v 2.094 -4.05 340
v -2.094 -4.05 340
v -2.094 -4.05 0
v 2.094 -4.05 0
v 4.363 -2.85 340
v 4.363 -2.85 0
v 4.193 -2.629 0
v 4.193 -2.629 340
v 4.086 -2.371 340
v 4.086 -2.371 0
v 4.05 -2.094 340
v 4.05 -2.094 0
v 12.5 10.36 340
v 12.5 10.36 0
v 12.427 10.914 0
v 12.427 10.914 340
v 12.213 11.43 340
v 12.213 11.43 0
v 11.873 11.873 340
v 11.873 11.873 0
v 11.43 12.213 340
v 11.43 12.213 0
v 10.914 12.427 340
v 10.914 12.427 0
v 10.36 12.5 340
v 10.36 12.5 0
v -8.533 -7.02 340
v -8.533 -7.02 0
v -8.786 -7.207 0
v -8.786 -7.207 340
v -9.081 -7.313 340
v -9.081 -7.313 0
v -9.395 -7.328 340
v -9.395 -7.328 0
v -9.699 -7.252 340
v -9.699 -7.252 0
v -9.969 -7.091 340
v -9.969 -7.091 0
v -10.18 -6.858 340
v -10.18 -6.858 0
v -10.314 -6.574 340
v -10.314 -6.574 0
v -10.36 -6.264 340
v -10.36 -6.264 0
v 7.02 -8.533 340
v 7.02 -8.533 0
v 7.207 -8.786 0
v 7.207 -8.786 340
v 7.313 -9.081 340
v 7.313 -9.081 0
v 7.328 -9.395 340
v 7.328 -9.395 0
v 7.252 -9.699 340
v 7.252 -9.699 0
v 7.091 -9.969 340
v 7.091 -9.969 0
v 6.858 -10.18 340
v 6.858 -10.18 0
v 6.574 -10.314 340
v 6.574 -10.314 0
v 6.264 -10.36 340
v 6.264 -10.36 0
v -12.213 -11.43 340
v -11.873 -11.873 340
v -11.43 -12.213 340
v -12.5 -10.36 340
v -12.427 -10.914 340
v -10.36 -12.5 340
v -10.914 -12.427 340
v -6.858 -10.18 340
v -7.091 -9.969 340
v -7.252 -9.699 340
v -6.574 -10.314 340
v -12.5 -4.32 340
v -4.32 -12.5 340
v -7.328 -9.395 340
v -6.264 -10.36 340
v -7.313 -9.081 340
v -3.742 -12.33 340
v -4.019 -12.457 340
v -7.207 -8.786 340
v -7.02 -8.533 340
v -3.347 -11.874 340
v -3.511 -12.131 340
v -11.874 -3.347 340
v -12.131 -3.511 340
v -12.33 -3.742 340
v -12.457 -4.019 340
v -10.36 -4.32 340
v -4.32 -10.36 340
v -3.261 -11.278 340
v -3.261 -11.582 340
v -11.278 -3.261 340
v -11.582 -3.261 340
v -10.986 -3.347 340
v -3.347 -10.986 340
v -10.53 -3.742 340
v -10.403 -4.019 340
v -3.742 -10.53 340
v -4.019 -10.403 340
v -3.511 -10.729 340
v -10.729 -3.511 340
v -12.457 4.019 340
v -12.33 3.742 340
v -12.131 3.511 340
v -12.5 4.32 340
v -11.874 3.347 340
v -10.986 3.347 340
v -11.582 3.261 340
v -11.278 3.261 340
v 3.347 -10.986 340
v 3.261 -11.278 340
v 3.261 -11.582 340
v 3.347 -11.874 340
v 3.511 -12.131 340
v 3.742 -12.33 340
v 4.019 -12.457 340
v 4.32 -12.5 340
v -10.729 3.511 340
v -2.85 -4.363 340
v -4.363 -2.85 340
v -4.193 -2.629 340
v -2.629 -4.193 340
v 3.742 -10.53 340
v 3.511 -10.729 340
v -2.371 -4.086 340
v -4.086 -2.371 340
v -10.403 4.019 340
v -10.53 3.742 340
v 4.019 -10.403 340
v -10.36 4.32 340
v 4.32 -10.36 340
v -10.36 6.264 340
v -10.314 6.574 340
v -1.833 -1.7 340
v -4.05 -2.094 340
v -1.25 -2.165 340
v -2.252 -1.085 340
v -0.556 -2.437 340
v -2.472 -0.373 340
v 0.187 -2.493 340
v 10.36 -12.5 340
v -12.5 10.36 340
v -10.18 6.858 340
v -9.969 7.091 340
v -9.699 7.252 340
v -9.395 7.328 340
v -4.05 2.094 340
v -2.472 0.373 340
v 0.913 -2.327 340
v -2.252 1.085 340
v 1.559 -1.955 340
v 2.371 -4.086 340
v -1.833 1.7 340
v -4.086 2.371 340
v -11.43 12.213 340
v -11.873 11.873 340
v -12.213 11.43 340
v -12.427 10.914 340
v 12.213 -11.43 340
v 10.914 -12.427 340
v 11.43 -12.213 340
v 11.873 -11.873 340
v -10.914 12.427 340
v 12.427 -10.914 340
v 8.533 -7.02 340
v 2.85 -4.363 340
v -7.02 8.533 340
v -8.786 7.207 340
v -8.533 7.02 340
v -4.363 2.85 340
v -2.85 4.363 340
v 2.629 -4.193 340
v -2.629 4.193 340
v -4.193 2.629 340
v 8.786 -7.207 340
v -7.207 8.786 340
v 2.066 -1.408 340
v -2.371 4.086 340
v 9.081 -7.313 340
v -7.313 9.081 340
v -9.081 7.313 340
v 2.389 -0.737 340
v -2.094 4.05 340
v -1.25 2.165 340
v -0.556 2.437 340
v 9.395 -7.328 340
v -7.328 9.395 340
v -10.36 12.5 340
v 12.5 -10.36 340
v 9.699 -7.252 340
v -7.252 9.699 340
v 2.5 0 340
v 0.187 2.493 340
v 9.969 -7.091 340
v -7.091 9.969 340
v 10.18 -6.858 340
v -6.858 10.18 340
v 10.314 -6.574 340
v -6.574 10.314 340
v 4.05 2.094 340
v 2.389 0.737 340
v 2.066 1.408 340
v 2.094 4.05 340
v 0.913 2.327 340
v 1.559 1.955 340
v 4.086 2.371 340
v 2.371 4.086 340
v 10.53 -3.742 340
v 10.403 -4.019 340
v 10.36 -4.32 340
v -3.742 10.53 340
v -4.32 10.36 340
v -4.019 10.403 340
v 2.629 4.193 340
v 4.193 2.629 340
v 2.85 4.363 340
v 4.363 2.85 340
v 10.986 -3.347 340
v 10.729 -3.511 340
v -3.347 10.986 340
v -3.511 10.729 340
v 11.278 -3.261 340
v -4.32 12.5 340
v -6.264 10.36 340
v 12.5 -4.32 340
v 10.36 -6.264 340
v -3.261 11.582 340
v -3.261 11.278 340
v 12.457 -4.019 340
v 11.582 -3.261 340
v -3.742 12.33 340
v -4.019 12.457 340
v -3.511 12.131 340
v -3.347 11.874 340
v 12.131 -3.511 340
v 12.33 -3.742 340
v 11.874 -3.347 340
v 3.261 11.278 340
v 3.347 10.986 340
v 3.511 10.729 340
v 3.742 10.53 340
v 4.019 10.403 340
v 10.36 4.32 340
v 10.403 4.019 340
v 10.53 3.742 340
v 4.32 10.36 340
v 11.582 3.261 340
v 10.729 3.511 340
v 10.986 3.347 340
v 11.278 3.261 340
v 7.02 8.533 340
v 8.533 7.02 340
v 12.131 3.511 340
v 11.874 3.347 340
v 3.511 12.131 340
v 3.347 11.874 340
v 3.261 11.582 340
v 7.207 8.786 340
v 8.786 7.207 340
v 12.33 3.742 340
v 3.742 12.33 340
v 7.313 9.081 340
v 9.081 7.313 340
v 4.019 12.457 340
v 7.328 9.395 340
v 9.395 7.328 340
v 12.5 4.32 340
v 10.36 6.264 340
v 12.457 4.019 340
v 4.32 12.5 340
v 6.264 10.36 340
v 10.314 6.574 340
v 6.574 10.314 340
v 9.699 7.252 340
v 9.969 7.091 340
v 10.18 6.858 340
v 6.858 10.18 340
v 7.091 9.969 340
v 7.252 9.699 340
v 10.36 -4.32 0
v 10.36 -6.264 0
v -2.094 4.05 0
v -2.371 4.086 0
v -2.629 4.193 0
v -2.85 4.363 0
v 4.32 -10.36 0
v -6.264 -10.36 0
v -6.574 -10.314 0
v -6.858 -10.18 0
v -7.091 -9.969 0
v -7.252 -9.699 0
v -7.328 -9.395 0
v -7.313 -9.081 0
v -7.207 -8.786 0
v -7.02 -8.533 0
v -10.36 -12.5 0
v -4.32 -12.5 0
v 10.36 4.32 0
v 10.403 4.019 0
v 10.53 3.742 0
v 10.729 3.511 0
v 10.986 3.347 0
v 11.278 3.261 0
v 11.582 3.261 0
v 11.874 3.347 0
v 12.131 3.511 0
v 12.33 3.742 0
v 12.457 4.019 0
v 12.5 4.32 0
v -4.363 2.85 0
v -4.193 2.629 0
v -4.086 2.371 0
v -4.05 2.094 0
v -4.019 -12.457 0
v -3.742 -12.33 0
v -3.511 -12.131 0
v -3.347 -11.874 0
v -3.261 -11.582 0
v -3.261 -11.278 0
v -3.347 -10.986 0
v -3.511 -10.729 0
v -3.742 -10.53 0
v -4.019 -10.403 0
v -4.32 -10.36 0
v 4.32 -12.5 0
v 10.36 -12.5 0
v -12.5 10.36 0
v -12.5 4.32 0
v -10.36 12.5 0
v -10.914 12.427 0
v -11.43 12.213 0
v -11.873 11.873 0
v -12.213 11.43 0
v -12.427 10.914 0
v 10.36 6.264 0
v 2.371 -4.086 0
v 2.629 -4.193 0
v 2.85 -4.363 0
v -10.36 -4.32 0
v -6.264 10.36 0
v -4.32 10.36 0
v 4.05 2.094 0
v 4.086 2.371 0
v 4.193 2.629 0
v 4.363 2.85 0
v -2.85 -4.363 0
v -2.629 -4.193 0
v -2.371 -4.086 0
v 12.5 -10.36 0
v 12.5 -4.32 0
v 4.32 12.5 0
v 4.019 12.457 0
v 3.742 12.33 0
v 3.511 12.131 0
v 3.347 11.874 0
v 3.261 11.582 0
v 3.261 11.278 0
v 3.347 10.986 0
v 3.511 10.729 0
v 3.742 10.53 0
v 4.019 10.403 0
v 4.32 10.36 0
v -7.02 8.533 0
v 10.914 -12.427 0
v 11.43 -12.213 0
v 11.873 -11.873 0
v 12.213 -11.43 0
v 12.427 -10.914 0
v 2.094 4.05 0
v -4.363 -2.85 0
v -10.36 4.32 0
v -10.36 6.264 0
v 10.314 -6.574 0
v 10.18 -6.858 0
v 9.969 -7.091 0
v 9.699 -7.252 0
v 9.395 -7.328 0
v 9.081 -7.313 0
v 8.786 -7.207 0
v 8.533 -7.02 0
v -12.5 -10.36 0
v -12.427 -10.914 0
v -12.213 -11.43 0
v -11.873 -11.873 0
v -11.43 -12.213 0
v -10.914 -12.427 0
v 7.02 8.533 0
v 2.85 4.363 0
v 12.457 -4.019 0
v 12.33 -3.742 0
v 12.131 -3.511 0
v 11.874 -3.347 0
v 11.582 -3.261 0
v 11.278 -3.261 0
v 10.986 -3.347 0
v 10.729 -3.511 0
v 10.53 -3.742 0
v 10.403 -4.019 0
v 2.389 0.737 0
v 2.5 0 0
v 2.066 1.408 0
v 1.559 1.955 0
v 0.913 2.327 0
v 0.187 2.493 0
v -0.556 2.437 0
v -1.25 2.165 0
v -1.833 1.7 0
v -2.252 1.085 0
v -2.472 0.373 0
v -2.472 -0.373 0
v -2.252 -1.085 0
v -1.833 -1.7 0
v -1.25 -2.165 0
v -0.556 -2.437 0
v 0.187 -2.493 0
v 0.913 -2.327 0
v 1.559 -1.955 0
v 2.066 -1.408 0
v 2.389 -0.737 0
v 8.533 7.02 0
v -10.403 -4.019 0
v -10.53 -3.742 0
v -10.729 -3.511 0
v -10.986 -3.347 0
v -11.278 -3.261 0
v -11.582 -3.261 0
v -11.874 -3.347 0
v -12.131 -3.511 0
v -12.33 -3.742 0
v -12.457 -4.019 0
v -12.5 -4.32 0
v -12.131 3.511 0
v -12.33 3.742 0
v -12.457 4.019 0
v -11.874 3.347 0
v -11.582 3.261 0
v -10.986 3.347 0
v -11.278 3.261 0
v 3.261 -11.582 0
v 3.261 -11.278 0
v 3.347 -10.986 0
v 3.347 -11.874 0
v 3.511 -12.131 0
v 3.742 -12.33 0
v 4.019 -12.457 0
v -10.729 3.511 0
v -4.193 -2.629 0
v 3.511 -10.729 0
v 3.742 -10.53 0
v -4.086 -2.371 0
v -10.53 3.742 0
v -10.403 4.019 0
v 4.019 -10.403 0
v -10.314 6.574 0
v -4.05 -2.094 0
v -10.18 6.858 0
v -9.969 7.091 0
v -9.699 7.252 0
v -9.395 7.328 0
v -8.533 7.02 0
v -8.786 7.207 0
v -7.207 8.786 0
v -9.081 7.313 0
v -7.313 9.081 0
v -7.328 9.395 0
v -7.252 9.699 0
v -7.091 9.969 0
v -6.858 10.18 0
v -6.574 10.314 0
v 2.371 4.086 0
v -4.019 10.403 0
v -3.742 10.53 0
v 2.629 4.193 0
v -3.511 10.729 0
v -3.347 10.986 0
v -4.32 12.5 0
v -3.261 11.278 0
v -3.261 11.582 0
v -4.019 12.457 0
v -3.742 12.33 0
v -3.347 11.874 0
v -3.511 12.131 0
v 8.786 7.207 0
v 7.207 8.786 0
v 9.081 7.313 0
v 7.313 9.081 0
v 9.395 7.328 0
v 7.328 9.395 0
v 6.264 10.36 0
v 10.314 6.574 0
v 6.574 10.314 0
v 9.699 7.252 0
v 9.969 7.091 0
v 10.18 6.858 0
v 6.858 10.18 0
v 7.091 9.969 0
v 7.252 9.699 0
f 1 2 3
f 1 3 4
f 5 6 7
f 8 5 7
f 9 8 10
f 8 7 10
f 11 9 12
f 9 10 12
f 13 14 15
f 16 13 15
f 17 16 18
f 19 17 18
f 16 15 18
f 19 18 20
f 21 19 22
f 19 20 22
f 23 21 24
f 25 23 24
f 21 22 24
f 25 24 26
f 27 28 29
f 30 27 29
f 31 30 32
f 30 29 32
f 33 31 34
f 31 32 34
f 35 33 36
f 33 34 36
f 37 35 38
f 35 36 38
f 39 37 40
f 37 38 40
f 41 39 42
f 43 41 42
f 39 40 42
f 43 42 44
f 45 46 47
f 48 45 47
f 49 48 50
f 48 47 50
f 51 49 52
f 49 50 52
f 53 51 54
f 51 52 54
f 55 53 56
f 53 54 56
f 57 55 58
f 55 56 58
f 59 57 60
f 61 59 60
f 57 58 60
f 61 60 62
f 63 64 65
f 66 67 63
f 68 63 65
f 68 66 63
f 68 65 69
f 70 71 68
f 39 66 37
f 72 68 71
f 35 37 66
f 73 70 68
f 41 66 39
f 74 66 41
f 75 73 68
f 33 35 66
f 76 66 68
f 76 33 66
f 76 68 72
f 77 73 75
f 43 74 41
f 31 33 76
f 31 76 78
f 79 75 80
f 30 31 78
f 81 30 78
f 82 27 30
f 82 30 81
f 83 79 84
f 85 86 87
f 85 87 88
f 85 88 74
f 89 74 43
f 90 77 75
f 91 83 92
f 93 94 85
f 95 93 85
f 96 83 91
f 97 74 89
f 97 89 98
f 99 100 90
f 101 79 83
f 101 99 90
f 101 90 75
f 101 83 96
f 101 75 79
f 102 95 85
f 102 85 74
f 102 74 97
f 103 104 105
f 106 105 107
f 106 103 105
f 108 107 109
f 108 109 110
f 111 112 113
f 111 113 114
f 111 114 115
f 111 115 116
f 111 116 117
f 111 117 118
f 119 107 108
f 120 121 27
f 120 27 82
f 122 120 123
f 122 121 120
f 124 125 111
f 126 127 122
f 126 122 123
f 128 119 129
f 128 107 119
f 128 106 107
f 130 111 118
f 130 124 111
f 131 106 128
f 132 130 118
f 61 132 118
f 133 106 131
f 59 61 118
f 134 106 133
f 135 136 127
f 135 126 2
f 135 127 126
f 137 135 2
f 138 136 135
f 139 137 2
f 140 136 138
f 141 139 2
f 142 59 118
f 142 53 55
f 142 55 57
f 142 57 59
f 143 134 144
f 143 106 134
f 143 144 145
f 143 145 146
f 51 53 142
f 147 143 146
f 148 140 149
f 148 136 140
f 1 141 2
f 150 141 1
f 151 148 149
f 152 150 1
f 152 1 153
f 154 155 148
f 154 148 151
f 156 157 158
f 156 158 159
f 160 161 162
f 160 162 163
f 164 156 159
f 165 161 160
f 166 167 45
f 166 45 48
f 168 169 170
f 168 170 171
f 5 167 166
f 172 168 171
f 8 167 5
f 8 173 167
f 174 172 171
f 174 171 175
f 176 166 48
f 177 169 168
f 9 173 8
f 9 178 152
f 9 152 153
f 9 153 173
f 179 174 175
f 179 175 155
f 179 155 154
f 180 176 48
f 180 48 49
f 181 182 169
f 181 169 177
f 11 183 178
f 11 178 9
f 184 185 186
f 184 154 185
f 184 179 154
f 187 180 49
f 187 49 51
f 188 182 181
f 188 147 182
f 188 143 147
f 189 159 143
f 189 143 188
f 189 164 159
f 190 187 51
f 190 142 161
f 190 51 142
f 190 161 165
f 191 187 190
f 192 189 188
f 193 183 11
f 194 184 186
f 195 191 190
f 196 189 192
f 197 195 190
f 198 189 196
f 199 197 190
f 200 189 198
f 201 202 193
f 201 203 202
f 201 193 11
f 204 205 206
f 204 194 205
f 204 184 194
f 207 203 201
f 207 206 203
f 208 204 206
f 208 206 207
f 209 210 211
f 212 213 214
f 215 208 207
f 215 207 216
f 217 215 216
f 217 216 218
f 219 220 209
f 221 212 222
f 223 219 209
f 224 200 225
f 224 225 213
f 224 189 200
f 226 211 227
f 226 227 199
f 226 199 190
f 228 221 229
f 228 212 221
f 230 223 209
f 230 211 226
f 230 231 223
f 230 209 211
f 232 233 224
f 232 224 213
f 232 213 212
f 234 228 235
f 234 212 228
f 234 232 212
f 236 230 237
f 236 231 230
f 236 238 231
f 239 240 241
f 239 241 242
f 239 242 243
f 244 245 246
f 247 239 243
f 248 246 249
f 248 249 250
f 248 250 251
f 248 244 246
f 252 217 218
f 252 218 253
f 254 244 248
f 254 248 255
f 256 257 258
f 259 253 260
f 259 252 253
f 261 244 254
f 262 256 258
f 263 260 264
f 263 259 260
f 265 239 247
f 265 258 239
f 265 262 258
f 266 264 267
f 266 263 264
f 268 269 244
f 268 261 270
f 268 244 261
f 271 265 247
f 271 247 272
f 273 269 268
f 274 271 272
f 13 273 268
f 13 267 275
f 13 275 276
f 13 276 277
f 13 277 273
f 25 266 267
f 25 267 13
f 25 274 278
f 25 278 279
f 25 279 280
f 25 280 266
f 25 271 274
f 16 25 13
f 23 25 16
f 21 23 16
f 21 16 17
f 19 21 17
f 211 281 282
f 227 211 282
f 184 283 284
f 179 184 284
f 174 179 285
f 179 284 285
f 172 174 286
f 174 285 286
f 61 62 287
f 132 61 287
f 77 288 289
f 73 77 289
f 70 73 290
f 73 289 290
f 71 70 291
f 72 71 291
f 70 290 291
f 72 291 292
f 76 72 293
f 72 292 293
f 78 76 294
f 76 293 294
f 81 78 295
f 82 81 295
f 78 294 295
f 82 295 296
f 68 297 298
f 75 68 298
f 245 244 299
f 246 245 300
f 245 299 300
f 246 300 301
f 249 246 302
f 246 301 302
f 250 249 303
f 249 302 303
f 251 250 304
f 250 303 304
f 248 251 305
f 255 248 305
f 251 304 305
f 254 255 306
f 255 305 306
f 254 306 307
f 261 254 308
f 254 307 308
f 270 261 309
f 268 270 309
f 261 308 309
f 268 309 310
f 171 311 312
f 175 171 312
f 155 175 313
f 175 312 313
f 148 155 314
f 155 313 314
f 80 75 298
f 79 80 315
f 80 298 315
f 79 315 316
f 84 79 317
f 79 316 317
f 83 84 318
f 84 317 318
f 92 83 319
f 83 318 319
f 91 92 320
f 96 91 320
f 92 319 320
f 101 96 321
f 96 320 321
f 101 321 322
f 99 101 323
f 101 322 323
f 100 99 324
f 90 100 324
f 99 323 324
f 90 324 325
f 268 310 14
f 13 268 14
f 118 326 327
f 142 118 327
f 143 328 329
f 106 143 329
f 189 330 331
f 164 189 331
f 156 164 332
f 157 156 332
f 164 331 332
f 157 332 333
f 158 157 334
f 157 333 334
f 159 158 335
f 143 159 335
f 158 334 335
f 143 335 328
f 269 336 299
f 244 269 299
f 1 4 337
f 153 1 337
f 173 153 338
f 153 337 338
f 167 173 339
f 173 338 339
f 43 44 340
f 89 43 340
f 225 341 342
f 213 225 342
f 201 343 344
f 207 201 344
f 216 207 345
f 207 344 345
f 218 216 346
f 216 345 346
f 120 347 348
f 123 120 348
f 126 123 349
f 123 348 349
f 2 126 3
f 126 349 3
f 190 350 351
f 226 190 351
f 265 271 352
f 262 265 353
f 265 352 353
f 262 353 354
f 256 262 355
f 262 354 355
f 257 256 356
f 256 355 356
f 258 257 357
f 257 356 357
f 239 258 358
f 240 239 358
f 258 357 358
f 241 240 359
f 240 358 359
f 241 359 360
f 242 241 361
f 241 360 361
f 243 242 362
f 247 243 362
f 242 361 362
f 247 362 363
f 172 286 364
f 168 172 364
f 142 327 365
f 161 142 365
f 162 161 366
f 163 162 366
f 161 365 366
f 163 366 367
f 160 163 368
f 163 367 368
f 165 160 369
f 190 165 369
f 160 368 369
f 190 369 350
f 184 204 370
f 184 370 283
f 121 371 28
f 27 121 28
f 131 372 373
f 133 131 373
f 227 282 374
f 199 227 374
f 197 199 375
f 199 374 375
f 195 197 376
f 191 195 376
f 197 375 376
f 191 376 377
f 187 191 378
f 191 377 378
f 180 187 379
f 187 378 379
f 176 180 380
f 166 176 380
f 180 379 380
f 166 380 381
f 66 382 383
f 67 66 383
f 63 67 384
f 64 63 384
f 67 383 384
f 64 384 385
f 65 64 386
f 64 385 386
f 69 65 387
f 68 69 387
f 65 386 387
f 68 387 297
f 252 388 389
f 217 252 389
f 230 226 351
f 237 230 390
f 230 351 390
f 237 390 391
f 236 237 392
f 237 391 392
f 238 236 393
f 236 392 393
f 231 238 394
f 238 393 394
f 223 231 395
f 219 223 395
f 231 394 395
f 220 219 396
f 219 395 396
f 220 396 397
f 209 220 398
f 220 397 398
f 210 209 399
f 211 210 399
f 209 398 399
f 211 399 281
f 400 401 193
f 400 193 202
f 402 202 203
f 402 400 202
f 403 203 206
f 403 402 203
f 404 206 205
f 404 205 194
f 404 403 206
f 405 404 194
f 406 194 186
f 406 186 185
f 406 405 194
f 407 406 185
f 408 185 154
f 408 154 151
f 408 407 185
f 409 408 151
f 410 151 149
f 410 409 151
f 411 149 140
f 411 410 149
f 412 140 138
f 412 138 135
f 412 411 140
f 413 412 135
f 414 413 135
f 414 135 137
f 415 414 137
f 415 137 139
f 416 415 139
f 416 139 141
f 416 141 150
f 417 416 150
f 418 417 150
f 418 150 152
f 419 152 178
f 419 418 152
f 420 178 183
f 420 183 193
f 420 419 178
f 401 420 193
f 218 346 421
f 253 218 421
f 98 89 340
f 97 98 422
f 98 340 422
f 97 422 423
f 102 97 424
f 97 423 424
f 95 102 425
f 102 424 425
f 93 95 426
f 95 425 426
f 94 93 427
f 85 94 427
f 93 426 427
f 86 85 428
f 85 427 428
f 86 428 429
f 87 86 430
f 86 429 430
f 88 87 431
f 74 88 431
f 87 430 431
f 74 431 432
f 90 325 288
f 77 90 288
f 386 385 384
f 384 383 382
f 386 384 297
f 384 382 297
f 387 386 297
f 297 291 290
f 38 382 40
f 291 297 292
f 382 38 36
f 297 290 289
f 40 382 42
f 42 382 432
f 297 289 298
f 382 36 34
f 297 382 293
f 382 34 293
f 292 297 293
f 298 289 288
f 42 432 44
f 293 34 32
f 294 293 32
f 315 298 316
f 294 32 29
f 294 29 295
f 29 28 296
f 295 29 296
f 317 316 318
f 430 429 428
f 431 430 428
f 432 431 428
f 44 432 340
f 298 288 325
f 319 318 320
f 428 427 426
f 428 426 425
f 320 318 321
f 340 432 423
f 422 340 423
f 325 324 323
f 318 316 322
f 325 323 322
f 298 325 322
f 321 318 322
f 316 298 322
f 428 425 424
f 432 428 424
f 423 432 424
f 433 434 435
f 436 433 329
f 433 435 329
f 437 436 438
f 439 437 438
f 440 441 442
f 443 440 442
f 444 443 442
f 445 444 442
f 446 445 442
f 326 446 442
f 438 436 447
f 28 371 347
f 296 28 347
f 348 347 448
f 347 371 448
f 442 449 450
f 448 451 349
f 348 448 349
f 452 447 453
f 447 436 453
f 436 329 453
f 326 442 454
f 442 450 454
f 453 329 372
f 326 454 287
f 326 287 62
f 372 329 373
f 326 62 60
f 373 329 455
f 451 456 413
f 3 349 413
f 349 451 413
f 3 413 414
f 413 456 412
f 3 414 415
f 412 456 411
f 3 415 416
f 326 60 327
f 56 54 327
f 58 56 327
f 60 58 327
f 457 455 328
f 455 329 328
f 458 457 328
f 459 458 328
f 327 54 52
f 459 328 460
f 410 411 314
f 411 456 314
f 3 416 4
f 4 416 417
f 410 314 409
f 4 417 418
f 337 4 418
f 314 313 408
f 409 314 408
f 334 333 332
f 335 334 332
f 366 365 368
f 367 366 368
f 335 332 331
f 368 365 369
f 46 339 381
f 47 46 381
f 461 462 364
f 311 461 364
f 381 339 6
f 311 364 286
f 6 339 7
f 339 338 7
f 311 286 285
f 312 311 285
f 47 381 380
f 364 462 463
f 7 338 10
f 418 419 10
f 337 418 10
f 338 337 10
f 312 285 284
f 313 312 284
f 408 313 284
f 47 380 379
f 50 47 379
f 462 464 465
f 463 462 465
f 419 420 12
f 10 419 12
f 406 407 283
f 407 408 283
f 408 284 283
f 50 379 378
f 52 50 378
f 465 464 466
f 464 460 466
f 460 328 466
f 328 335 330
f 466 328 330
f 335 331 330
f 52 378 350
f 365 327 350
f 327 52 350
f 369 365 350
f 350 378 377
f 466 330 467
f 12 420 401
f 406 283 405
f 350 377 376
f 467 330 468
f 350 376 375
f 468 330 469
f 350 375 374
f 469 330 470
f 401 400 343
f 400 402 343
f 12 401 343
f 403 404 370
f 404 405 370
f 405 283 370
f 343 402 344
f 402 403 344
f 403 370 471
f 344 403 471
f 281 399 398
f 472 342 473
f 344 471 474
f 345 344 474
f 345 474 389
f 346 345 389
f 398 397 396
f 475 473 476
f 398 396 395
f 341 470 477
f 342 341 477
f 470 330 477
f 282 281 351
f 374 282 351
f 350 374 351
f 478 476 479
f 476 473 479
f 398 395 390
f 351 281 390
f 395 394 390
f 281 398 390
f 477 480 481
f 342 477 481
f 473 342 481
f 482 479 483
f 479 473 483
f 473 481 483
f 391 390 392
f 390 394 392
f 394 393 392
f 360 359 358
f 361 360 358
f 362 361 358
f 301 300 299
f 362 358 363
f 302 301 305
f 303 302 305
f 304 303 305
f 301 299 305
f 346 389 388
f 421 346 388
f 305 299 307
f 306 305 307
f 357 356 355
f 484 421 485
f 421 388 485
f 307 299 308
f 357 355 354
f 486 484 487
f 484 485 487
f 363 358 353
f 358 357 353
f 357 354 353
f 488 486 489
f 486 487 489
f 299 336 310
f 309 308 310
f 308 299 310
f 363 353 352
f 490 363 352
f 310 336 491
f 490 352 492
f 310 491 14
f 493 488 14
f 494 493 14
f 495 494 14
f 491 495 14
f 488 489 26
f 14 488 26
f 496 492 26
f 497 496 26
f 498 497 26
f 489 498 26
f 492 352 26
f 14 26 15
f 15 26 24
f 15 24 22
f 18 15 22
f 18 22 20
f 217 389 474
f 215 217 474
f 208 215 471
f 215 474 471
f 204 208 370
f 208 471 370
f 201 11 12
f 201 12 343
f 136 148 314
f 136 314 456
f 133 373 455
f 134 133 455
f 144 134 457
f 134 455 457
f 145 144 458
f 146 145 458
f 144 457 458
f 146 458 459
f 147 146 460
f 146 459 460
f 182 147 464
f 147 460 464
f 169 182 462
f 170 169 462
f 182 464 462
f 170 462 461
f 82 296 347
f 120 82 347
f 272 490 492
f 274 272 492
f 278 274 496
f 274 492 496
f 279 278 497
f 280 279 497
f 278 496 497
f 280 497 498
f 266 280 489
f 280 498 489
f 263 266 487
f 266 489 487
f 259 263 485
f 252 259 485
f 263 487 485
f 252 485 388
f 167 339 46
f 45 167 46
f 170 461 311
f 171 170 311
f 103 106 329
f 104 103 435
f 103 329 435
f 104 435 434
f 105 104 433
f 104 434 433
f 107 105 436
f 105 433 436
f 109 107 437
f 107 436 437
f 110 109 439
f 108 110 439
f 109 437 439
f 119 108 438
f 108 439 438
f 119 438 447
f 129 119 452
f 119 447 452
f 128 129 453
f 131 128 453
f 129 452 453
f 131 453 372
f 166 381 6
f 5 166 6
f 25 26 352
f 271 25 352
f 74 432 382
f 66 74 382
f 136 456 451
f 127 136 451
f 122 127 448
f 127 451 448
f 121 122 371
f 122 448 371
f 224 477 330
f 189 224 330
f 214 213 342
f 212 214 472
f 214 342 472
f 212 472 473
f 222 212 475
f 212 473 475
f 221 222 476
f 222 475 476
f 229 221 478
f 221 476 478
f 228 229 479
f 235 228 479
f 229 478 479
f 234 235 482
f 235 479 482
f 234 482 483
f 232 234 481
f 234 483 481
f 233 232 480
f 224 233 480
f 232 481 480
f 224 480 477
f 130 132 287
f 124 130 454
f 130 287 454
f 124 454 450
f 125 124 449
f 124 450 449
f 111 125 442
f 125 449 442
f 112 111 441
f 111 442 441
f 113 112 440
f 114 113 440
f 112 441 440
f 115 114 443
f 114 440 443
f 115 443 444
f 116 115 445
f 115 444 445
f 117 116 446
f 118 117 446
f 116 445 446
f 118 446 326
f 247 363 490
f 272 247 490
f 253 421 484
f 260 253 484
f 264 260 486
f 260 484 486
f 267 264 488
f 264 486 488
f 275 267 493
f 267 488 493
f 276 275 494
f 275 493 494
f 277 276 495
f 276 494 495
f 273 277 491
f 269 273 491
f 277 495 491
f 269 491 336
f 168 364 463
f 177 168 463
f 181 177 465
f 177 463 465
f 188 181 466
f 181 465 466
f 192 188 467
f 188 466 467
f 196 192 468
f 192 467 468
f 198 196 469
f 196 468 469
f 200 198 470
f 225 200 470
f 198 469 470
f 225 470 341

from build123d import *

# Parameters (mm, degrees)
F0_R     = 2.5
F1_DEPTH = 340


with BuildPart() as f1:
    # F0 (on Top) → F1 (new body)
    with BuildSketch(Plane.XY):
        with BuildLine():
            ThreePointArc((-10.36, 12.5), (-11.873209, 11.873209), (-12.5, 10.36))
            Line((-12.5, 10.36), (-12.5, 4.32))
            ThreePointArc((-12.5, 4.32), (-11.43, 3.25), (-10.36, 4.32))
            Line((-10.36, 4.32), (-10.36, 6.263583))
            ThreePointArc((-10.36, 6.263583), (-9.699471, 7.252134), (-8.533396, 7.020187))
            Line((-8.533396, 7.020187), (-4.363396, 2.850187))
            ThreePointArc((-4.363396, 2.850187), (-4.131449, 2.503054), (-4.05, 2.093583))
            Line((-4.05, 2.093583), (-4.05, 0))
            Line((-4.05, 0), (-4.05, -2.093583))
            ThreePointArc((-4.05, -2.093583), (-4.131449, -2.503054), (-4.363396, -2.850187))
            Line((-4.363396, -2.850187), (-8.533396, -7.020187))
            ThreePointArc((-8.533396, -7.020187), (-9.699471, -7.252134), (-10.36, -6.263583))
            Line((-10.36, -6.263583), (-10.36, -4.32))
            ThreePointArc((-10.36, -4.32), (-11.43, -3.25), (-12.5, -4.32))
            Line((-12.5, -4.32), (-12.5, -10.36))
            ThreePointArc((-12.5, -10.36), (-11.873209, -11.873209), (-10.36, -12.5))
            Line((-10.36, -12.5), (-4.32, -12.5))
            ThreePointArc((-4.32, -12.5), (-3.25, -11.43), (-4.32, -10.36))
            Line((-4.32, -10.36), (-6.263583, -10.36))
            ThreePointArc((-6.263583, -10.36), (-7.252134, -9.699471), (-7.020187, -8.533396))
            Line((-7.020187, -8.533396), (-2.850187, -4.363396))
            ThreePointArc((-2.850187, -4.363396), (-2.503054, -4.131449), (-2.093583, -4.05))
            Line((-2.093583, -4.05), (0, -4.05))
            Line((0, -4.05), (2.093583, -4.05))
            ThreePointArc((2.093583, -4.05), (2.503054, -4.131449), (2.850187, -4.363396))
            Line((2.850187, -4.363396), (7.020187, -8.533396))
            ThreePointArc((7.020187, -8.533396), (7.252134, -9.699471), (6.263583, -10.36))
            Line((6.263583, -10.36), (4.32, -10.36))
            ThreePointArc((4.32, -10.36), (3.25, -11.43), (4.32, -12.5))
            Line((4.32, -12.5), (10.36, -12.5))
            ThreePointArc((10.36, -12.5), (11.873209, -11.873209), (12.5, -10.36))
            Line((12.5, -10.36), (12.5, -4.32))
            ThreePointArc((12.5, -4.32), (11.43, -3.25), (10.36, -4.32))
            Line((10.36, -4.32), (10.36, -6.263583))
            ThreePointArc((10.36, -6.263583), (9.699471, -7.252134), (8.533396, -7.020187))
            Line((8.533396, -7.020187), (4.363396, -2.850187))
            ThreePointArc((4.363396, -2.850187), (4.131449, -2.503054), (4.05, -2.093583))
            Line((4.05, -2.093583), (4.05, 0))
            Line((4.05, 0), (4.05, 2.093583))
            ThreePointArc((4.05, 2.093583), (4.131449, 2.503054), (4.363396, 2.850187))
            Line((4.363396, 2.850187), (8.533396, 7.020187))
            ThreePointArc((8.533396, 7.020187), (9.699471, 7.252134), (10.36, 6.263583))
            Line((10.36, 6.263583), (10.36, 4.32))
            ThreePointArc((10.36, 4.32), (11.43, 3.25), (12.5, 4.32))
            Line((12.5, 4.32), (12.5, 10.36))
            ThreePointArc((12.5, 10.36), (11.873209, 11.873209), (10.36, 12.5))
            Line((10.36, 12.5), (4.32, 12.5))
            ThreePointArc((4.32, 12.5), (3.25, 11.43), (4.32, 10.36))
            Line((4.32, 10.36), (6.263583, 10.36))
            ThreePointArc((6.263583, 10.36), (7.252134, 9.699471), (7.020187, 8.533396))
            Line((7.020187, 8.533396), (2.850187, 4.363396))
            ThreePointArc((2.850187, 4.363396), (2.503054, 4.131449), (2.093583, 4.05))
            Line((2.093583, 4.05), (0, 4.05))
            Line((0, 4.05), (-2.093583, 4.05))
            ThreePointArc((-2.093583, 4.05), (-2.503054, 4.131449), (-2.850187, 4.363396))
            Line((-2.850187, 4.363396), (-7.020187, 8.533396))
            ThreePointArc((-7.020187, 8.533396), (-7.252134, 9.699471), (-6.263583, 10.36))
            Line((-6.263583, 10.36), (-4.32, 10.36))
            ThreePointArc((-4.32, 10.36), (-3.25, 11.43), (-4.32, 12.5))
            Line((-4.32, 12.5), (-10.36, 12.5))
        make_face()
        Circle(F0_R, mode=Mode.SUBTRACT)
    extrude(amount=F1_DEPTH)


solid = f1.part
